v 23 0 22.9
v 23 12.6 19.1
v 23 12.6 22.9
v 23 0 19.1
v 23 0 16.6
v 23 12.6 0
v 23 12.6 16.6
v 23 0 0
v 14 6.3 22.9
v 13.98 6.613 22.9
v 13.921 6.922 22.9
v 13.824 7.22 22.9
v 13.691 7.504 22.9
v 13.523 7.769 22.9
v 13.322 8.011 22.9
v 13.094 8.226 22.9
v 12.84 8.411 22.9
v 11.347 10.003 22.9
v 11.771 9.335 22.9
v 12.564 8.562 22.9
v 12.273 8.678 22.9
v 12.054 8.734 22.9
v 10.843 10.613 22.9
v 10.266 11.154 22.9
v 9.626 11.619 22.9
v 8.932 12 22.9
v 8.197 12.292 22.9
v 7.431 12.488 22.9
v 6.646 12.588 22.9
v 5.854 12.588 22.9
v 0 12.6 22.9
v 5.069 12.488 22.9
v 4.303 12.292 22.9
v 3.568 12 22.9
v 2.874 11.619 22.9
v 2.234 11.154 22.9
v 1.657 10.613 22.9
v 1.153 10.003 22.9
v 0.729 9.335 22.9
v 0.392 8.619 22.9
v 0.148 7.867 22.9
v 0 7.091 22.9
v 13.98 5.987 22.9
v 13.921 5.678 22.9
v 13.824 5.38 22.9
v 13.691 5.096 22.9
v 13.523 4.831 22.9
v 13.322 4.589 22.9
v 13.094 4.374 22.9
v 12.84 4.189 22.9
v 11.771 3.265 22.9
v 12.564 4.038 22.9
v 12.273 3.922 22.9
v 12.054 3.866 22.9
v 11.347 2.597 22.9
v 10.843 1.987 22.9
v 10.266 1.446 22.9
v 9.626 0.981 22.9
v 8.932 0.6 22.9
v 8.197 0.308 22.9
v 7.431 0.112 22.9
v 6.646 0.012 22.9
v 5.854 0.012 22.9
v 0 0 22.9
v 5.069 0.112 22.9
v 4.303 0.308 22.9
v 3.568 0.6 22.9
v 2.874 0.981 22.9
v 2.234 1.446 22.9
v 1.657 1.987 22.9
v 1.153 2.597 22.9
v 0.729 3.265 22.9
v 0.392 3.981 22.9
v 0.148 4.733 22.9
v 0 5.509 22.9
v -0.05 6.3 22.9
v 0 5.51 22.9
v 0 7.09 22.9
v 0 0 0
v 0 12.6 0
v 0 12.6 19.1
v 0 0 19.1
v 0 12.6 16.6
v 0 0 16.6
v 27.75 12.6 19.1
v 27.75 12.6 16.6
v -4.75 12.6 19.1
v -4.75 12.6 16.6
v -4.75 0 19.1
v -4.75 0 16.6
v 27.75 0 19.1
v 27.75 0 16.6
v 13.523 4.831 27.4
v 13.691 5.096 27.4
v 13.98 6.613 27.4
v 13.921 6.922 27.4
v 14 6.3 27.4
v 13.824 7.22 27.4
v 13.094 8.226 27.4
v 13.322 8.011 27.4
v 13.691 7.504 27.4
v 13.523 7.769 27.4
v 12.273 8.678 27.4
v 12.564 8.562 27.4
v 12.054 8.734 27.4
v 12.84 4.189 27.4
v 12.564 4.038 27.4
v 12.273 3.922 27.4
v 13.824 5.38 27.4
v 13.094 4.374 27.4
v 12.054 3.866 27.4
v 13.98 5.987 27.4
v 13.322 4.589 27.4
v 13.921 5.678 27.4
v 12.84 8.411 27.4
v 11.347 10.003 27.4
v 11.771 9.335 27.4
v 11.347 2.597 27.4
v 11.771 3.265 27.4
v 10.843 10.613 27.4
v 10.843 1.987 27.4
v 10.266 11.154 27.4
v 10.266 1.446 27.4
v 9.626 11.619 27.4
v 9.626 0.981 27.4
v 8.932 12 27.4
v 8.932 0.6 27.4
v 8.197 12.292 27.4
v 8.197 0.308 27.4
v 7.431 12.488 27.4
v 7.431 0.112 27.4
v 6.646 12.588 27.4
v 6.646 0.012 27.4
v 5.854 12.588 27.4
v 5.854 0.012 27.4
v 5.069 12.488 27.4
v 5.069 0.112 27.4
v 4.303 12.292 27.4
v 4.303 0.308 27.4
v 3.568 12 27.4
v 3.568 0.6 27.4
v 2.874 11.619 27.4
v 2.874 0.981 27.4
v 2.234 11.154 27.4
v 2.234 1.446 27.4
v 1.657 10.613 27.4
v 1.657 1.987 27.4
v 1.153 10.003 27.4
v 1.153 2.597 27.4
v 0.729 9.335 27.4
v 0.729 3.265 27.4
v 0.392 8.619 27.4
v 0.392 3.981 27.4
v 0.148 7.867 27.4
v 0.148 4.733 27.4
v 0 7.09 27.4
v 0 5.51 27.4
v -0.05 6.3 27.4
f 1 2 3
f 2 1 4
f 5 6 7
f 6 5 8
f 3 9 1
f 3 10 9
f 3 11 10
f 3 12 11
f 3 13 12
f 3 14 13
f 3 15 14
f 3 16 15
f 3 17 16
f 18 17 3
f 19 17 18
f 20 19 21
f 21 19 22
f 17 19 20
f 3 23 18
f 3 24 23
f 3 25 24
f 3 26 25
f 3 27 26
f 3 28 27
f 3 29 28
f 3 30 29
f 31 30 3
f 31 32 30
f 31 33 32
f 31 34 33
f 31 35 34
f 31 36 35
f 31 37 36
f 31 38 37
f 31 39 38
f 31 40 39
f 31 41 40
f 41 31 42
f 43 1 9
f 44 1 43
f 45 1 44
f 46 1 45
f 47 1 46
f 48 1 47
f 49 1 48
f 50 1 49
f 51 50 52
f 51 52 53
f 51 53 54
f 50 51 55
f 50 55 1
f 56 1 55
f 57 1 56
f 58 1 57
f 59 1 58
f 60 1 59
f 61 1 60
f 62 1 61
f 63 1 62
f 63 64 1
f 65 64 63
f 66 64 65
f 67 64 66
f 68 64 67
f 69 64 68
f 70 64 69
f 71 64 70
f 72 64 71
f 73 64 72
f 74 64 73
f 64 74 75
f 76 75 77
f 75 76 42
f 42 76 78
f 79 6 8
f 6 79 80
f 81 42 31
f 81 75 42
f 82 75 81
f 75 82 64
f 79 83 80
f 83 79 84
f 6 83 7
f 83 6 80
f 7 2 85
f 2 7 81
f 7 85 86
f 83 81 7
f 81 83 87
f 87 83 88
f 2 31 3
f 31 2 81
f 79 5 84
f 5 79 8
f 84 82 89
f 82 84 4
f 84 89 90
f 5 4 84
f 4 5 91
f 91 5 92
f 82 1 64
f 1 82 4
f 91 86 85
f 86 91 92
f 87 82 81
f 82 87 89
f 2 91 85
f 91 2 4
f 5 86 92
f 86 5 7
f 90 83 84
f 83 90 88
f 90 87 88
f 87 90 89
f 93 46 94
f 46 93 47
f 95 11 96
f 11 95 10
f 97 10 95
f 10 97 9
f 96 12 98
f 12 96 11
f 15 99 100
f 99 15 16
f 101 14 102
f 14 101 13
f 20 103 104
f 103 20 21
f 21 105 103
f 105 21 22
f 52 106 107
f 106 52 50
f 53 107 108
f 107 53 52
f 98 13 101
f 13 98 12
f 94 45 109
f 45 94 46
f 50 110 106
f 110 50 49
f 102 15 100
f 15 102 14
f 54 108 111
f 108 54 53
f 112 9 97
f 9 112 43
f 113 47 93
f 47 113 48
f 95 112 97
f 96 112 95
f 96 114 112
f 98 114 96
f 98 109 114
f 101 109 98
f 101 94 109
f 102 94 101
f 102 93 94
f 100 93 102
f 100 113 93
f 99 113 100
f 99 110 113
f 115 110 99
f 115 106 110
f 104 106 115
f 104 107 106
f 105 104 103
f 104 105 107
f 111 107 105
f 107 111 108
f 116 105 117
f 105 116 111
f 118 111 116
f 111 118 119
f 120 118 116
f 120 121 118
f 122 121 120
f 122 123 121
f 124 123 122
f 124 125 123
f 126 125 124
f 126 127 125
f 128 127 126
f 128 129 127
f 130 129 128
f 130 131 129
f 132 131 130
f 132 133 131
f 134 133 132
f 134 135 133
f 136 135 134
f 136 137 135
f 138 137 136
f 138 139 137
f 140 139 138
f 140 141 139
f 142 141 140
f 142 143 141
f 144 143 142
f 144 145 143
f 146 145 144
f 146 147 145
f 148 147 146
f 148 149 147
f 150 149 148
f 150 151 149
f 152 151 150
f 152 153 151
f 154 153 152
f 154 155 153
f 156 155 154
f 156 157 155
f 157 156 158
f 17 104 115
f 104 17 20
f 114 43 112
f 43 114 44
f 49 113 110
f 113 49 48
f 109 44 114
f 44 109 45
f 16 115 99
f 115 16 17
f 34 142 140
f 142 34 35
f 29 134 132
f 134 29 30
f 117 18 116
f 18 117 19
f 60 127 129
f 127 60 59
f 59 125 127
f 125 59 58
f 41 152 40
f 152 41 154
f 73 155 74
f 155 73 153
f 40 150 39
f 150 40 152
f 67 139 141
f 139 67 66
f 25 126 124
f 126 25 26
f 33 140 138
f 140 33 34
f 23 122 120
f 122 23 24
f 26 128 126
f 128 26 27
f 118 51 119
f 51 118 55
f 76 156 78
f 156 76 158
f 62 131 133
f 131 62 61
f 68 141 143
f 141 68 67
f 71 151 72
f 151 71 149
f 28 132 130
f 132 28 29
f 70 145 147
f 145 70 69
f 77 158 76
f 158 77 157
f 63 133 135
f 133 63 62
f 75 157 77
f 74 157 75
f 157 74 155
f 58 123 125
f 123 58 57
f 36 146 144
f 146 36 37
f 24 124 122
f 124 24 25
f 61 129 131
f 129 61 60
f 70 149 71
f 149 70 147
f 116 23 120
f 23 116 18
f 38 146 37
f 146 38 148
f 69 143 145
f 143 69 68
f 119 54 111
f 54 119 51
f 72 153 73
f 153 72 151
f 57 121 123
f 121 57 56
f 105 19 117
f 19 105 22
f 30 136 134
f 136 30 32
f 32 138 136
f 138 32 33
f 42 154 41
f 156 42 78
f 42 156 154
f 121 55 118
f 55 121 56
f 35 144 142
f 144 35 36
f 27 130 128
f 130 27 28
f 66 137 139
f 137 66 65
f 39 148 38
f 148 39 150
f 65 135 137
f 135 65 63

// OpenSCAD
$fn = 50;

servo9g();

module servo9g(){
    x1 = 23;
    y1=12.6;
    z1=22.9;
    x2 = 32.5;
    cube([x1,y1,z1]);
    translate([(x1-x2)/2,0,16.6]) cube([x2,12.6,2.5]);
    translate([x1/2,y1/2,z1]) cylinder(d=5,h=4.5);
    translate([x1/4+0.5,y1/2,z1]) cylinder(d=y1,h=4.5);
}
